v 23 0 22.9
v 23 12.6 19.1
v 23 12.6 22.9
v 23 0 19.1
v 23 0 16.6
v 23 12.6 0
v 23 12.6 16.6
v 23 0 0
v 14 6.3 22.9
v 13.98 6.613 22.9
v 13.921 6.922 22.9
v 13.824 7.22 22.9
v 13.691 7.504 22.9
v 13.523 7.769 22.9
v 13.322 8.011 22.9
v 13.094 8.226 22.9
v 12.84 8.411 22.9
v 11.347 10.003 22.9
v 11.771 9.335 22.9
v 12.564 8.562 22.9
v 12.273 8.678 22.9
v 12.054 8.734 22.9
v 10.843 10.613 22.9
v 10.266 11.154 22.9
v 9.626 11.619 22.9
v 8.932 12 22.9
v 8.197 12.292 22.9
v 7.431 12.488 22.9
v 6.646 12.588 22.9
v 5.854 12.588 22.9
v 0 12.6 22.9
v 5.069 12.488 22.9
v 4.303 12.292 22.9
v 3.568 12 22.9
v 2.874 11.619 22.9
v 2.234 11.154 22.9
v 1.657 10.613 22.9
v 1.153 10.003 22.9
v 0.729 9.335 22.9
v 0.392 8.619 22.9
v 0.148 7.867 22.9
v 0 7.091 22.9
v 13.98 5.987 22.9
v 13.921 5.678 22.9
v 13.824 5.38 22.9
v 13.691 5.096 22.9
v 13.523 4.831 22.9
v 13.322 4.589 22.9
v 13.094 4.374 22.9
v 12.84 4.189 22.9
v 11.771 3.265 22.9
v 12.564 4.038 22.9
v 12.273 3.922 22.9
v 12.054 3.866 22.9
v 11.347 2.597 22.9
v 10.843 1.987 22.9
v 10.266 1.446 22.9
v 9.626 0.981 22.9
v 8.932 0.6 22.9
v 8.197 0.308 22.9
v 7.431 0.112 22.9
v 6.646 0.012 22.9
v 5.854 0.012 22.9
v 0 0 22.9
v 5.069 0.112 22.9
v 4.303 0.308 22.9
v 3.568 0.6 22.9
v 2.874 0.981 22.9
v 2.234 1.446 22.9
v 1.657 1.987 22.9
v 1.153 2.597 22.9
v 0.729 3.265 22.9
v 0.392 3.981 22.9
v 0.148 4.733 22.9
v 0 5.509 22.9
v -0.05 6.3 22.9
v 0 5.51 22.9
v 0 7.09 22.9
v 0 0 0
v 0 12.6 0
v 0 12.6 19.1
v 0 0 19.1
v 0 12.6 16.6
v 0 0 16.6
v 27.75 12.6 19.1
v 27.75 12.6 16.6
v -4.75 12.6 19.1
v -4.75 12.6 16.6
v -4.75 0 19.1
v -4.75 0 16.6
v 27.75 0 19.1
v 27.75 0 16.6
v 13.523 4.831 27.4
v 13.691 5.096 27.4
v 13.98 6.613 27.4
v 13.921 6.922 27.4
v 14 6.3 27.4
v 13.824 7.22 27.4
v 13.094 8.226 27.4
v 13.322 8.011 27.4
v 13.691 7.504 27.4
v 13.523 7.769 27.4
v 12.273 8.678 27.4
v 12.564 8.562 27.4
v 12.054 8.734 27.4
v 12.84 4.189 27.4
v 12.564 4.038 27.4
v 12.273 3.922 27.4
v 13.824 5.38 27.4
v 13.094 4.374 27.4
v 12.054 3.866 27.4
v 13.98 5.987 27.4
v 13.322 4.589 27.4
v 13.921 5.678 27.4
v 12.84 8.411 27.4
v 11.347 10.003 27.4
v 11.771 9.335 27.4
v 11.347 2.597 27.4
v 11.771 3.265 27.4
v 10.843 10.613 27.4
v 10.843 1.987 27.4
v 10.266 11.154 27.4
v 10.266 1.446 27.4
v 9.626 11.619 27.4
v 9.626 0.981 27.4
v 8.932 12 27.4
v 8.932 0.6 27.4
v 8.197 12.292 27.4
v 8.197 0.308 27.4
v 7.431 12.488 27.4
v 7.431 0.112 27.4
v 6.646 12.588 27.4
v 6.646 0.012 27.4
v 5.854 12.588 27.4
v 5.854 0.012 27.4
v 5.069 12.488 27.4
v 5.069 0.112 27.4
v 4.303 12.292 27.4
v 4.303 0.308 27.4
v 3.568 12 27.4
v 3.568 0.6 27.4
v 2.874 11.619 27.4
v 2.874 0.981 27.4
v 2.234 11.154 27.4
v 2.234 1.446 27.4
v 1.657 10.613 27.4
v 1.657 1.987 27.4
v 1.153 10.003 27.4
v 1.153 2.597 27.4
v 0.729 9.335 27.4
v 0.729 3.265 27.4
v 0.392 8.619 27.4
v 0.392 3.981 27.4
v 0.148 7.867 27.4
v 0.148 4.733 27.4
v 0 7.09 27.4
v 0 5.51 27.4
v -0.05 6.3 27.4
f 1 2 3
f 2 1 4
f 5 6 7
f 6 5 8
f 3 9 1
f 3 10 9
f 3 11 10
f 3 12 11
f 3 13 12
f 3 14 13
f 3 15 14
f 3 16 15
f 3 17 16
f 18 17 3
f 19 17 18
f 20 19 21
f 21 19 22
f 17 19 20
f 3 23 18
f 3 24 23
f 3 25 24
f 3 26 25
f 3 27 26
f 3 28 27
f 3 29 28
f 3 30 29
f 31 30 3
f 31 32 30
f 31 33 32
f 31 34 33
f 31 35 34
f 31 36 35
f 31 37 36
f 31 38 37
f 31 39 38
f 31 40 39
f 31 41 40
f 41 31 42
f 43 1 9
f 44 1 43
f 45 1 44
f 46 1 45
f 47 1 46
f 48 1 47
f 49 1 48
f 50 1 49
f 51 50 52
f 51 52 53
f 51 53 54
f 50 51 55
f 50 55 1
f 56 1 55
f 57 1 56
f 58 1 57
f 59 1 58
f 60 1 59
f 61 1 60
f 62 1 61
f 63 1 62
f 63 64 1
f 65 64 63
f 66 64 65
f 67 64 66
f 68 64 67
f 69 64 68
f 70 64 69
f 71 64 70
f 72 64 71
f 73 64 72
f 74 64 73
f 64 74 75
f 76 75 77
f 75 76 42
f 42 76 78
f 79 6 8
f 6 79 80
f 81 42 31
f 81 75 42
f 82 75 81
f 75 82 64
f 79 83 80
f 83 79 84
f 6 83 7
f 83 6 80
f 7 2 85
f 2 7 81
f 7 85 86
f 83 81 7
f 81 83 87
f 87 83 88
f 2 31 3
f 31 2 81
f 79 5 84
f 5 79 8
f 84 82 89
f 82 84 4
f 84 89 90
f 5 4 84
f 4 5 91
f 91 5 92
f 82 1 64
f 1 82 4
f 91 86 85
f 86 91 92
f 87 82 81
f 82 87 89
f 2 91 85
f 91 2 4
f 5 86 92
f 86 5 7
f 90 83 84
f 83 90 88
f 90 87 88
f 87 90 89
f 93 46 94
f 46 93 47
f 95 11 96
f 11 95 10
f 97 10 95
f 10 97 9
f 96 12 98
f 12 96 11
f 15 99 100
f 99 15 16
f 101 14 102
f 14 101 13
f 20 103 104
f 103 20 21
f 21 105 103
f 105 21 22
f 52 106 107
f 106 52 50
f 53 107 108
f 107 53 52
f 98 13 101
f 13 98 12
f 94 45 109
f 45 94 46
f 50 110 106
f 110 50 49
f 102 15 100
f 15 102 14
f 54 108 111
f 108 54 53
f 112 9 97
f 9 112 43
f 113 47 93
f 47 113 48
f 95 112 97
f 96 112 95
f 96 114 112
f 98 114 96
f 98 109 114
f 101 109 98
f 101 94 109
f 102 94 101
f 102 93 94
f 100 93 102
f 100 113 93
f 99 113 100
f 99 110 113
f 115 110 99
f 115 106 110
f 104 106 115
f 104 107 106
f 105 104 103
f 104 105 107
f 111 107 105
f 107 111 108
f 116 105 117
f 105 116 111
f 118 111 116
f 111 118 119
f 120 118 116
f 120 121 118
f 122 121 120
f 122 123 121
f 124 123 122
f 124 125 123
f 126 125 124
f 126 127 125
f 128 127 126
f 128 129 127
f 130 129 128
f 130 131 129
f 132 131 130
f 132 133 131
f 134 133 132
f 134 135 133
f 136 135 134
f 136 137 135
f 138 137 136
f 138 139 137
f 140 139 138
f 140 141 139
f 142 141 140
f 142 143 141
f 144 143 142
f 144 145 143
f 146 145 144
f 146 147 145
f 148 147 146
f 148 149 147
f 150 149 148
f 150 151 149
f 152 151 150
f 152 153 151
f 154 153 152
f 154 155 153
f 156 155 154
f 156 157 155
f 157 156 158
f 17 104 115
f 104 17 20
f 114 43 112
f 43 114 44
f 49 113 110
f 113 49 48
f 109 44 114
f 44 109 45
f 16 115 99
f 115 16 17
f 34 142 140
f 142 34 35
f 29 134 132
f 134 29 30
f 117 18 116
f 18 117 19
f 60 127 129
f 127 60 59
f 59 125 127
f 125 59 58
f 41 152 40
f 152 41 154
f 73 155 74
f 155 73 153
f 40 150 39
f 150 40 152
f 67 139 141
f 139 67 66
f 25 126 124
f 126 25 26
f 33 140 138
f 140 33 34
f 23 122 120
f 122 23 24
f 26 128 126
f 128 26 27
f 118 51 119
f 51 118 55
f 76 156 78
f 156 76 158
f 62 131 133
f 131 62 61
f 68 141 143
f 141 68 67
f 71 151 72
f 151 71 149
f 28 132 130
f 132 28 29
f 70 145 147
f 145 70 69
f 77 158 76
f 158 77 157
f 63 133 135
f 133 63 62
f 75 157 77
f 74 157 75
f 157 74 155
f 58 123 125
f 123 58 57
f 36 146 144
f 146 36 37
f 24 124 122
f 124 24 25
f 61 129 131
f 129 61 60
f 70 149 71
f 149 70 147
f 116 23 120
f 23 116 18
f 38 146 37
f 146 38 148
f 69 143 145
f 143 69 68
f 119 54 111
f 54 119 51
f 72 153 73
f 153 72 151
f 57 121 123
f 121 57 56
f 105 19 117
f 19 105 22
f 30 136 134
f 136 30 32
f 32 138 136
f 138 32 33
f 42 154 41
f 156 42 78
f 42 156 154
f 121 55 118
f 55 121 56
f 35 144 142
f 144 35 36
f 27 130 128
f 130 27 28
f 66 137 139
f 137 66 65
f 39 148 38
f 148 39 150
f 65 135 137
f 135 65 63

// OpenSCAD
$fn = 50;

servo9g();

module servo9g(){
    x1 = 23;
    y1=12.6;
    z1=22.9;
    x2 = 32.5;
    cube([x1,y1,z1]);
    translate([(x1-x2)/2,0,16.6]) cube([x2,12.6,2.5]);
    translate([x1/2,y1/2,z1]) cylinder(d=5,h=4.5);
    translate([x1/4+0.5,y1/2,z1]) cylinder(d=y1,h=4.5);
}
